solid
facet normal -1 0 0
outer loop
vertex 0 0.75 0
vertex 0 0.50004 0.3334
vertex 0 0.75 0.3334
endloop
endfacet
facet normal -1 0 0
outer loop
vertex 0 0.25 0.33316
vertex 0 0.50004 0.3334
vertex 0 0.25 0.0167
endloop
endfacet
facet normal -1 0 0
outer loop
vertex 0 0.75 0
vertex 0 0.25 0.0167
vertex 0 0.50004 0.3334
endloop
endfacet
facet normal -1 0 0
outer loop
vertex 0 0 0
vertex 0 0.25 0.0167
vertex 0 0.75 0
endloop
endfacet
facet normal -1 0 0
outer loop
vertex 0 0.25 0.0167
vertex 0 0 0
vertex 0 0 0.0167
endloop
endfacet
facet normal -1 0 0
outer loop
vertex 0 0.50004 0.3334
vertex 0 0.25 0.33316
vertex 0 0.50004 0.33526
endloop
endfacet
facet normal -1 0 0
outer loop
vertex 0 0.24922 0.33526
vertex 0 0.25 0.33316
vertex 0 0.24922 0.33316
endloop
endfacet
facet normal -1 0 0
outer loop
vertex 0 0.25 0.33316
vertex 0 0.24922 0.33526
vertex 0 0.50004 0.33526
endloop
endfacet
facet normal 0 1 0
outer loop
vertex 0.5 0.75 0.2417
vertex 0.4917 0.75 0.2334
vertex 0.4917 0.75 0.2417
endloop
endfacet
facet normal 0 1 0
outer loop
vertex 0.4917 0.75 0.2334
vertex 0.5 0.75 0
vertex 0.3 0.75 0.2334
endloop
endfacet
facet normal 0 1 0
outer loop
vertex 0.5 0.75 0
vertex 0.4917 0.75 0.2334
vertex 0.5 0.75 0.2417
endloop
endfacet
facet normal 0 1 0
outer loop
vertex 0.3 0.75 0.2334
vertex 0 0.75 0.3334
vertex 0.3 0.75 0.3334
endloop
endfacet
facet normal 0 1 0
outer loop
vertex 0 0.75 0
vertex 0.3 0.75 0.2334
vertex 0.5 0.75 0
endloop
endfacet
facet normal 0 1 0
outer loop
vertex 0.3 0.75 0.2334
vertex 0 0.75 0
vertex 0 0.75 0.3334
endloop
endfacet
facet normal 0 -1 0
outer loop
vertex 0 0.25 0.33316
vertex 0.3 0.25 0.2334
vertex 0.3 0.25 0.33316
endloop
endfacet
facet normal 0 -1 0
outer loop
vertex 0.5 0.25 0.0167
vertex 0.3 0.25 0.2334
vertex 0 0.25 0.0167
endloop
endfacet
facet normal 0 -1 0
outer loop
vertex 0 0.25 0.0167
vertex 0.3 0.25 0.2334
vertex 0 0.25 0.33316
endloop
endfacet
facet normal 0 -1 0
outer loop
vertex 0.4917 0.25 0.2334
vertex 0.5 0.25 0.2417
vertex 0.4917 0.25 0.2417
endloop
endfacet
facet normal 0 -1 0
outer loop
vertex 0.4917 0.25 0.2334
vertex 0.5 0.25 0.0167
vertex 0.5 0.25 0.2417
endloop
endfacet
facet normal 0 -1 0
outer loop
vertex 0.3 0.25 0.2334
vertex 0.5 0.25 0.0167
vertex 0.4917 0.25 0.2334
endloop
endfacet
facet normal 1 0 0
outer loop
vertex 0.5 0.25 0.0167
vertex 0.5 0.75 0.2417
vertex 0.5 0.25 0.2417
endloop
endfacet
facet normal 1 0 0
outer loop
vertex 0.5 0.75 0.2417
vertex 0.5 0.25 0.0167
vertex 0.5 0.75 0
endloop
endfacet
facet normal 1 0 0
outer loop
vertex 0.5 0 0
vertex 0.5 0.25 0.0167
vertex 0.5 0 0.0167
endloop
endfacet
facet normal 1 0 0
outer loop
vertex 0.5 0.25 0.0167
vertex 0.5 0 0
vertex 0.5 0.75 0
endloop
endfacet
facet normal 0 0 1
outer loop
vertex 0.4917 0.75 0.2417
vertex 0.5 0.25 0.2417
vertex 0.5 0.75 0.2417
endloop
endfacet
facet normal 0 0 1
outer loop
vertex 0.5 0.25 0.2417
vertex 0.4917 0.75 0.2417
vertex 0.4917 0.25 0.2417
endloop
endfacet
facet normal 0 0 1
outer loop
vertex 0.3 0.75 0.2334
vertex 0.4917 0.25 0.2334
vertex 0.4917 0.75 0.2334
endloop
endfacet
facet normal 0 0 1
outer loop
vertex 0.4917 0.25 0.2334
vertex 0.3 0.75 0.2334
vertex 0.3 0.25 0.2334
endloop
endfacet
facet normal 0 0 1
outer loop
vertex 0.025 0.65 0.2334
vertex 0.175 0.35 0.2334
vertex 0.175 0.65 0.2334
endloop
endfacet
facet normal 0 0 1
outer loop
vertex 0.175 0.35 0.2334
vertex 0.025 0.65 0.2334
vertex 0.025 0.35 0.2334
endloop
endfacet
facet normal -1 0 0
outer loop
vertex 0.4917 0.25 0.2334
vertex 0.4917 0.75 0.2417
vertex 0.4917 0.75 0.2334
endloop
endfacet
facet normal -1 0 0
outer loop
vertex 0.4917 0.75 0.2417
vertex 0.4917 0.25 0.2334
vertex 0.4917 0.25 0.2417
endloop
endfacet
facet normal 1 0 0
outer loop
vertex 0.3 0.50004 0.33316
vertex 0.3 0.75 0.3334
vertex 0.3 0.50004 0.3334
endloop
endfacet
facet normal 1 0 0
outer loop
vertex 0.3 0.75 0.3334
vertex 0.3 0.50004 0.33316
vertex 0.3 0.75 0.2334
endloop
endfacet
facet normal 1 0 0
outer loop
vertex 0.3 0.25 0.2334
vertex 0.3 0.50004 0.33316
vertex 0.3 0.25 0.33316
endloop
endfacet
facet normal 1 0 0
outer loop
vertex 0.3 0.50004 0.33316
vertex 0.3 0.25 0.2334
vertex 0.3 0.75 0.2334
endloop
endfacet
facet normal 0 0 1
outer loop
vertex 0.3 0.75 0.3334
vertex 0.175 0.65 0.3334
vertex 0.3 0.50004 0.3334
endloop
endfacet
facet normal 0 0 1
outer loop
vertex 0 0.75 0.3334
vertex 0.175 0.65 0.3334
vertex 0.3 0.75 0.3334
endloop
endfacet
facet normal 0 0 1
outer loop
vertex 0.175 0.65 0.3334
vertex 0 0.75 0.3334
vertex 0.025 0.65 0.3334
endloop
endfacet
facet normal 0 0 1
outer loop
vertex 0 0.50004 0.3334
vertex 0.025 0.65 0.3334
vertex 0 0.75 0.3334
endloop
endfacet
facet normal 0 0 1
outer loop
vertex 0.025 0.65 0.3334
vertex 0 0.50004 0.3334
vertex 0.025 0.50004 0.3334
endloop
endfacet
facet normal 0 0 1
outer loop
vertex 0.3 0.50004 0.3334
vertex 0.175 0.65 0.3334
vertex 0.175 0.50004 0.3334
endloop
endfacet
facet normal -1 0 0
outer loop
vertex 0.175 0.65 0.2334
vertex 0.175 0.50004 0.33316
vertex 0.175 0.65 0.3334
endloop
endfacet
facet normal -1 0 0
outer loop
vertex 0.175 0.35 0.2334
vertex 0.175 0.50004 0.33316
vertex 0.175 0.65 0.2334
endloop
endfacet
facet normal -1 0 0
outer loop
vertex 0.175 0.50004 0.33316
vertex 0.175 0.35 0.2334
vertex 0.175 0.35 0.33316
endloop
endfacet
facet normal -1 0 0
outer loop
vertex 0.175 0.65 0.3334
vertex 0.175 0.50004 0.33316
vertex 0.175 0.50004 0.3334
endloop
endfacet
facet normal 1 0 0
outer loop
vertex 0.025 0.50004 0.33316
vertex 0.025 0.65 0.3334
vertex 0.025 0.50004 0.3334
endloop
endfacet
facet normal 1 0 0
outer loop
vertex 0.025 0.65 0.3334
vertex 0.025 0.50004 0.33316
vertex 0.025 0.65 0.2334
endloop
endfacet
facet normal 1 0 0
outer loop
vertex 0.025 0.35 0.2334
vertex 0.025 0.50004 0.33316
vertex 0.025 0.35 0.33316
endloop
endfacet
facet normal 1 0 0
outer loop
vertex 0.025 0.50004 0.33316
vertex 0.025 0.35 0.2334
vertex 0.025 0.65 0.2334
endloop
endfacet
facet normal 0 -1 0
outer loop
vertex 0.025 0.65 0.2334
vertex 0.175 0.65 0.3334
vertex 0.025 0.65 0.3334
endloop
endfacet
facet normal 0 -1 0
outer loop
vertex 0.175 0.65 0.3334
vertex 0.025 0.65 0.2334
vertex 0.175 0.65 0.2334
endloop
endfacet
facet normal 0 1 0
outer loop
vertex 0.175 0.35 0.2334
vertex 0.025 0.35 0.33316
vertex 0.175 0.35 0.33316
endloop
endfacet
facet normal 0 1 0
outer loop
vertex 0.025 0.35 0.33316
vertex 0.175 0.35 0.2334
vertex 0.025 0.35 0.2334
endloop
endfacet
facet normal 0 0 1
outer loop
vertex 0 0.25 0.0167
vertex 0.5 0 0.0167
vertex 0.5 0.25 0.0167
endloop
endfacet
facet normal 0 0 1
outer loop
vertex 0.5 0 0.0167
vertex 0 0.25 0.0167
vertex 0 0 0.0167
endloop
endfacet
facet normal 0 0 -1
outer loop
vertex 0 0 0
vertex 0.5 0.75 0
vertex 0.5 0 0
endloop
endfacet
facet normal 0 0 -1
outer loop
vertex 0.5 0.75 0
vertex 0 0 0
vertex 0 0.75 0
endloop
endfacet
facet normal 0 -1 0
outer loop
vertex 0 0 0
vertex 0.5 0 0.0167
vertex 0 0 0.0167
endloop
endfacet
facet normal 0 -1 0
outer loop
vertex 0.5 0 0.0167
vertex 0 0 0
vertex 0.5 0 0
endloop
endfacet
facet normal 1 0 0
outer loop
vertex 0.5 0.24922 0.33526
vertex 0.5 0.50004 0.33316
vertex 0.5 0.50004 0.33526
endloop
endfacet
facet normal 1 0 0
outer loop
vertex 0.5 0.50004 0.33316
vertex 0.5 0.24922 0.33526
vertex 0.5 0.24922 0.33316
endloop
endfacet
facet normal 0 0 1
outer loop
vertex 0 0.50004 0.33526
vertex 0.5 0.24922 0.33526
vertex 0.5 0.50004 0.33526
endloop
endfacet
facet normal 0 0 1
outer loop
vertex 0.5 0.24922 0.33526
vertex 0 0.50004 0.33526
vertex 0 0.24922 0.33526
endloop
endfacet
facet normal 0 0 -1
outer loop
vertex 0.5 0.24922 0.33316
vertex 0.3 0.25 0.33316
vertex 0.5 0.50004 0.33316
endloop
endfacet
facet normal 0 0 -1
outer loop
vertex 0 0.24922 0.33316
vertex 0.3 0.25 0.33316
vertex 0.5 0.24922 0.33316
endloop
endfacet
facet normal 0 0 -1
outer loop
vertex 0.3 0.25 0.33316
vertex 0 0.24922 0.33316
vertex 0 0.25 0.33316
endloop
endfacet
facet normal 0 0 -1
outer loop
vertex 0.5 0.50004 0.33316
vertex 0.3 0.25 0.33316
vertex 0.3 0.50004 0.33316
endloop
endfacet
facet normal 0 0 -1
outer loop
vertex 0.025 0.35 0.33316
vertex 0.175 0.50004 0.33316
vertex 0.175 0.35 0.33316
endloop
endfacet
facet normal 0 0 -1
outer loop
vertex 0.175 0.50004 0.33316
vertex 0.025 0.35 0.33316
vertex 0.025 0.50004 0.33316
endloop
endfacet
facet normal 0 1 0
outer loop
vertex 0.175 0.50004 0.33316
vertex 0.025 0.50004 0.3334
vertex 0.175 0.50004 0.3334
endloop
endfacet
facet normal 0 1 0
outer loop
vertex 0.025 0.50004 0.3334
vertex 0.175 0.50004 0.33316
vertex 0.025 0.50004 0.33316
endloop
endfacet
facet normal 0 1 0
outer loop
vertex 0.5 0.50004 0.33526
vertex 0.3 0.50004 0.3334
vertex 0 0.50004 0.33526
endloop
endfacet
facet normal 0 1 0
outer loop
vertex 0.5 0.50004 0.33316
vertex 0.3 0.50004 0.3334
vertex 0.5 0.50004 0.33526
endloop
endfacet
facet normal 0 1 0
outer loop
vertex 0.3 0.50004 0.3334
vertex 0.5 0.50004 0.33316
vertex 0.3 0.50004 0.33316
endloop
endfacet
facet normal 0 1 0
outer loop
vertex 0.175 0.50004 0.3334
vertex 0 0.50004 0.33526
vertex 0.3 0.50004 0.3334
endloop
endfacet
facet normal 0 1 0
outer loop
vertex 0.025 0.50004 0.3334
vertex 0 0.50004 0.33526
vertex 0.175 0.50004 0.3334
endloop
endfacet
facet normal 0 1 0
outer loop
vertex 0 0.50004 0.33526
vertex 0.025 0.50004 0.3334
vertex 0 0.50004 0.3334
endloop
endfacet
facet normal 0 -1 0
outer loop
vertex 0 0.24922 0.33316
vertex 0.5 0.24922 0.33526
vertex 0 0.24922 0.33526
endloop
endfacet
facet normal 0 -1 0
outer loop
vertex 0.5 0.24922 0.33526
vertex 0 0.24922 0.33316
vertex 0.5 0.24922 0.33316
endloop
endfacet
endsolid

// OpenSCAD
// ==============================
// Global Parameters (all units consistent)
// ==============================
// Base Slab Dimensions
base_length = 0.5;       // X-axis (left-right)
base_width = 0.75;       // Y-axis (front-back)
base_thickness = 0.0167; // Z-axis (height from datum Z=0)
$fn = 100;               // Curve resolution

// Upper Rear Rectangular Feature
upper_rear_x = 0.5;
upper_rear_y = 0.5;
upper_rear_front_offset = 0.25;
upper_rear_top_z = 0.2334; // Total height from base datum

// Edge Strips on Upper Rear Feature
strip_x_width = 0.0083;
strip_y_length = 0.5;
strip_z_thickness = 0.0083;
strip_front_offset = 0.25;

// Thin Transverse Upper Feature
transverse_x = 0.5;
transverse_y = 0.250819;
transverse_front_offset = 0.24922;
transverse_thickness = 0.0021;
transverse_top_z = 0.335265; // Total height from base datum

// Stepped Portion Dimensions
shallow_pad_x = 0.3;
shallow_pad_z_depth = 0.1;
deep_pad_x = 0.2;
deep_pad_z_depth = 0.2167;

// Internal Void Parameters
void_x = 0.15;
void_y = 0.3;
void_clearance = 0.01; // Ensure void cuts fully through material

// ==============================
// Module Definitions
// ==============================
module base_slab() {
    // Origin at front-left-bottom corner of base
    cube([base_length, base_width, base_thickness]);
}

module upper_rear_feature() {
    translate([0, upper_rear_front_offset, base_thickness])
    cube([
        upper_rear_x, 
        upper_rear_y, 
        upper_rear_top_z - base_thickness
    ]);
}

module edge_strips() {
    // Left edge strip
    translate([0, strip_front_offset, upper_rear_top_z])
    cube([strip_x_width, strip_y_length, strip_z_thickness]);
    
    // Right edge strip
    translate([base_length - strip_x_width, strip_front_offset, upper_rear_top_z])
    cube([strip_x_width, strip_y_length, strip_z_thickness]);
}

module transverse_feature() {
    translate([
        0, 
        transverse_front_offset, 
        transverse_top_z - transverse_thickness
    ])
    cube([transverse_x, transverse_y, transverse_thickness]);
}

module stepped_solid() {
    union() {
        // Shallow upper pad (above upper rear feature shoulder)
        translate([0, upper_rear_front_offset, upper_rear_top_z])
        cube([
            shallow_pad_x, 
            upper_rear_y, 
            shallow_pad_z_depth
        ]);
        
        // Deeper lower pad (below upper rear feature shoulder, same left/front/back edges)
        translate([0, upper_rear_front_offset, upper_rear_top_z - deep_pad_z_depth])
        cube([
            deep_pad_x, 
            upper_rear_y, 
            deep_pad_z_depth
        ]);
    }
}

module internal_void() {
    // Cuts fully through stepped solid region
    translate([
        0.025, 
        upper_rear_front_offset + 0.1, 
        upper_rear_top_z - deep_pad_z_depth - void_clearance
    ])
    cube([
        void_x, 
        void_y, 
        shallow_pad_z_depth + deep_pad_z_depth + 2*void_clearance
    ]);
}

// ==============================
// Main Assembly
// ==============================
union() {
    base_slab();
    upper_rear_feature();
    edge_strips();
    transverse_feature();
    
    // Stepped portion with internal void cutout
    difference() {
        stepped_solid();
        internal_void();
    }
}
